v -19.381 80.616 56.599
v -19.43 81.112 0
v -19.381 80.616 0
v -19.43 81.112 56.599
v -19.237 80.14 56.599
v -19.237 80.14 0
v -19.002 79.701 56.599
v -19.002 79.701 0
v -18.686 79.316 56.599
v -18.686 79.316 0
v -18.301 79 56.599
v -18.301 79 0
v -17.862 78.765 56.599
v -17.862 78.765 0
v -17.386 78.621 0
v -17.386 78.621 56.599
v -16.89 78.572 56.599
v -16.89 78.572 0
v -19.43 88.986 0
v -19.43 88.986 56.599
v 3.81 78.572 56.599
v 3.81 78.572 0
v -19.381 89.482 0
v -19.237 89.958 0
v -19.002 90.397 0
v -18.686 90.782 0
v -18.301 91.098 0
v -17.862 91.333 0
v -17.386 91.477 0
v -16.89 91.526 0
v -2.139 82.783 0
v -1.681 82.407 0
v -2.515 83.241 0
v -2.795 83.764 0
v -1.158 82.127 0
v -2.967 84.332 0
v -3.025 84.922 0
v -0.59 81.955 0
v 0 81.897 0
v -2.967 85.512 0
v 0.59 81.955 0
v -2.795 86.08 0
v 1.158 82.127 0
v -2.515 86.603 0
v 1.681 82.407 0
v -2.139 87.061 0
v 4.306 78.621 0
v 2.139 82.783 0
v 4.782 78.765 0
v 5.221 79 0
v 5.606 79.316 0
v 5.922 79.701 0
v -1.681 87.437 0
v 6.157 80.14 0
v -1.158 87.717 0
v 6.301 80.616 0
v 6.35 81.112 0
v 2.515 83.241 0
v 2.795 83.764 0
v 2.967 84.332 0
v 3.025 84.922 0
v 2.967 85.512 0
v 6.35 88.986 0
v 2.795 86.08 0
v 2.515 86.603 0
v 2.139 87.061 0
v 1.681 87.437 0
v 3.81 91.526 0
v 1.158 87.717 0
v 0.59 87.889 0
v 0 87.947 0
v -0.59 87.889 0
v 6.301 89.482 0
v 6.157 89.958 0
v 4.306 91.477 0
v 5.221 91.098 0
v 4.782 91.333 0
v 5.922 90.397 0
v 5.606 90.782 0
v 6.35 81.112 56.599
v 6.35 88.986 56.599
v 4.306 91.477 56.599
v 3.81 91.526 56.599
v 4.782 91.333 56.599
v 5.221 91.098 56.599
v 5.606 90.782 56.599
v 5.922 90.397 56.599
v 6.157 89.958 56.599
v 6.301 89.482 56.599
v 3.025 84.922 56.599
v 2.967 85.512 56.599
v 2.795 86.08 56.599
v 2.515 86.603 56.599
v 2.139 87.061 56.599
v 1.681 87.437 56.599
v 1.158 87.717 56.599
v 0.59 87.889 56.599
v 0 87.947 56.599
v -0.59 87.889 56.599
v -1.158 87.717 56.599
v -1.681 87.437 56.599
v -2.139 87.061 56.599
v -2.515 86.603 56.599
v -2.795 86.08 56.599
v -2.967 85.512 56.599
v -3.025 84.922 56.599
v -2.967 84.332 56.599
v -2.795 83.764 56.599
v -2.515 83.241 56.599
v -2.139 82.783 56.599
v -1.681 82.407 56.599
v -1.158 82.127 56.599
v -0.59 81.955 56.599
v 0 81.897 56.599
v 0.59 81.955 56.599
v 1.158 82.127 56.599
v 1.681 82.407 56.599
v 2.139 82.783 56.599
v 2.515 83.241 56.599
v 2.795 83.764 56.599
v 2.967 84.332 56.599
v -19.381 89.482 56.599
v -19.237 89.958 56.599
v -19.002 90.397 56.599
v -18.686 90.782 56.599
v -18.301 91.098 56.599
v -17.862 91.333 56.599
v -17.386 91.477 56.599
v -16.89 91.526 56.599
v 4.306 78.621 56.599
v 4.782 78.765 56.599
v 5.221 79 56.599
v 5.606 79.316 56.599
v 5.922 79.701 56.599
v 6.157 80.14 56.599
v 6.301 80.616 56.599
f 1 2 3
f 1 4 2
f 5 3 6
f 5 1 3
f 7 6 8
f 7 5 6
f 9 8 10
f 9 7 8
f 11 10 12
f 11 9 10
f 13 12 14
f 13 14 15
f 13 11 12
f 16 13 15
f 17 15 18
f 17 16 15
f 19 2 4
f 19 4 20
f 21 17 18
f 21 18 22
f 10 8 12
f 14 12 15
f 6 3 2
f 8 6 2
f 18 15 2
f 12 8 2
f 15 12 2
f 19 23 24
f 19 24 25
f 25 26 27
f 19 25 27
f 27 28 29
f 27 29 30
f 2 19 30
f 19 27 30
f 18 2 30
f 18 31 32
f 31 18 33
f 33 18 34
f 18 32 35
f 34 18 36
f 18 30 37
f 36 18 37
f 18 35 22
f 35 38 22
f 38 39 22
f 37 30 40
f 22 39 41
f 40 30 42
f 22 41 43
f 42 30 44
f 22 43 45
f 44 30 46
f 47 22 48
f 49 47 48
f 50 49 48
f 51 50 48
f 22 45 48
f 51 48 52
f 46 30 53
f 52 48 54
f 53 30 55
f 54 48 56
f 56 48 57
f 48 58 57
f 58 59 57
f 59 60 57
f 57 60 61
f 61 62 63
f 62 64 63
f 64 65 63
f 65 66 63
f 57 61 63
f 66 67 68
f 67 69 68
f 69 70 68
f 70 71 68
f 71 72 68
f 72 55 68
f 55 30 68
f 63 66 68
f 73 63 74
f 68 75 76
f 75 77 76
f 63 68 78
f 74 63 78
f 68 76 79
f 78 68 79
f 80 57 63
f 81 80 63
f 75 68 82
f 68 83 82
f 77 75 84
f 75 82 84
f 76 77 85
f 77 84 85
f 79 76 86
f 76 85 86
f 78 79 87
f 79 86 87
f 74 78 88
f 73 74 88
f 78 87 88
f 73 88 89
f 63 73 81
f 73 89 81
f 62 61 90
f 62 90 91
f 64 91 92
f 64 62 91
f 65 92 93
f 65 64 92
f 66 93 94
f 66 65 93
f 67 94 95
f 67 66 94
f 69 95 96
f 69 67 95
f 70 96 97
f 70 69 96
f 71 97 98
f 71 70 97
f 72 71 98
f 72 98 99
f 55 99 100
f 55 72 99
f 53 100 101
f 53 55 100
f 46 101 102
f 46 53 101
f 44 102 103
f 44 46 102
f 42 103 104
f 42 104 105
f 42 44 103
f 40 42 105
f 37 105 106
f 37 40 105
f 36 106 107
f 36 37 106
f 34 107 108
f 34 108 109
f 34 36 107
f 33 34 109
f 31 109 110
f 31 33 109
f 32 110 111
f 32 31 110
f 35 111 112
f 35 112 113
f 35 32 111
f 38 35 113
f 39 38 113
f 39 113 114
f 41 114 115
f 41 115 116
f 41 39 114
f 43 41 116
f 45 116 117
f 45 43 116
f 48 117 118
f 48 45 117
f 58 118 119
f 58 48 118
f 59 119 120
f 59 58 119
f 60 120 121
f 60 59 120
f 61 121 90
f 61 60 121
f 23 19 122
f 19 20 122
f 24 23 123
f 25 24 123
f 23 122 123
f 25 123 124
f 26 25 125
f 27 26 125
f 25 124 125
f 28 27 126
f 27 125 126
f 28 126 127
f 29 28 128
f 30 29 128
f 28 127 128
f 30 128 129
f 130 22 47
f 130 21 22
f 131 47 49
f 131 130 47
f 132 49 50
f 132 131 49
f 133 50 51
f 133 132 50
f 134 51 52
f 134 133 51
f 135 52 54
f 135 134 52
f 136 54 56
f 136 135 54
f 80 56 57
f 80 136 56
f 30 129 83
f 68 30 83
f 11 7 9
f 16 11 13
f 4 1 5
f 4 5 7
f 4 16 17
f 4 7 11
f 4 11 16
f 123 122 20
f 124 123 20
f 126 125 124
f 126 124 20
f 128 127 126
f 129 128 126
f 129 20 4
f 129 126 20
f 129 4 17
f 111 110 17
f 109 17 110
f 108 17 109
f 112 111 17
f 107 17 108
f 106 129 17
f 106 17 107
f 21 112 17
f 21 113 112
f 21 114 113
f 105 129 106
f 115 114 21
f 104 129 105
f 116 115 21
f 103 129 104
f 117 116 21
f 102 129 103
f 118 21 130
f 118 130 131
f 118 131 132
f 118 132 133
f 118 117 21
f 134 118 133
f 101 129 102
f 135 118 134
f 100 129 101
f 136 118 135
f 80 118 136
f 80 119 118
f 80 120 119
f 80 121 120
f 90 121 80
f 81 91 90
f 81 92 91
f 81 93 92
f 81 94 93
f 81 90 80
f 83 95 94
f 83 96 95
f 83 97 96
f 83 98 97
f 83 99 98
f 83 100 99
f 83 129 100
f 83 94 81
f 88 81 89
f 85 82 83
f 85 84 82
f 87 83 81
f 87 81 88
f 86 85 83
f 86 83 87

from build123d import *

# Parameters (mm, degrees)
SKETCH1_W           = 25.780000002
SKETCH1_H           = 12.954026584
SKETCH1_R           = 3.025
BOSS_EXTRUDE1_DEPTH = 56.59882
FILLET2_R           = 2.54


with BuildPart() as part:
    # Sketch1 → Boss-Extrude1 (new body)
    with BuildSketch(Plane.XY):
        with Locations((-6.540000001, 85.048986708)):
            Rectangle(SKETCH1_W, SKETCH1_H)
        with Locations((0, 84.921973416)):
            Circle(SKETCH1_R, mode=Mode.SUBTRACT)
    extrude(amount=BOSS_EXTRUDE1_DEPTH)

    # Fillet2
    fillet2_edges = [part.edges().sort_by_distance(p)[0] for p in [
        (-19.430000002, 91.526, 28.29941),
        (6.35, 91.526, 28.29941),
        (6.35, 78.571973416, 28.29941),
        (-19.430000002, 78.571973416, 28.29941),
    ]]
    fillet(fillet2_edges, radius=FILLET2_R)


solid = part.part
